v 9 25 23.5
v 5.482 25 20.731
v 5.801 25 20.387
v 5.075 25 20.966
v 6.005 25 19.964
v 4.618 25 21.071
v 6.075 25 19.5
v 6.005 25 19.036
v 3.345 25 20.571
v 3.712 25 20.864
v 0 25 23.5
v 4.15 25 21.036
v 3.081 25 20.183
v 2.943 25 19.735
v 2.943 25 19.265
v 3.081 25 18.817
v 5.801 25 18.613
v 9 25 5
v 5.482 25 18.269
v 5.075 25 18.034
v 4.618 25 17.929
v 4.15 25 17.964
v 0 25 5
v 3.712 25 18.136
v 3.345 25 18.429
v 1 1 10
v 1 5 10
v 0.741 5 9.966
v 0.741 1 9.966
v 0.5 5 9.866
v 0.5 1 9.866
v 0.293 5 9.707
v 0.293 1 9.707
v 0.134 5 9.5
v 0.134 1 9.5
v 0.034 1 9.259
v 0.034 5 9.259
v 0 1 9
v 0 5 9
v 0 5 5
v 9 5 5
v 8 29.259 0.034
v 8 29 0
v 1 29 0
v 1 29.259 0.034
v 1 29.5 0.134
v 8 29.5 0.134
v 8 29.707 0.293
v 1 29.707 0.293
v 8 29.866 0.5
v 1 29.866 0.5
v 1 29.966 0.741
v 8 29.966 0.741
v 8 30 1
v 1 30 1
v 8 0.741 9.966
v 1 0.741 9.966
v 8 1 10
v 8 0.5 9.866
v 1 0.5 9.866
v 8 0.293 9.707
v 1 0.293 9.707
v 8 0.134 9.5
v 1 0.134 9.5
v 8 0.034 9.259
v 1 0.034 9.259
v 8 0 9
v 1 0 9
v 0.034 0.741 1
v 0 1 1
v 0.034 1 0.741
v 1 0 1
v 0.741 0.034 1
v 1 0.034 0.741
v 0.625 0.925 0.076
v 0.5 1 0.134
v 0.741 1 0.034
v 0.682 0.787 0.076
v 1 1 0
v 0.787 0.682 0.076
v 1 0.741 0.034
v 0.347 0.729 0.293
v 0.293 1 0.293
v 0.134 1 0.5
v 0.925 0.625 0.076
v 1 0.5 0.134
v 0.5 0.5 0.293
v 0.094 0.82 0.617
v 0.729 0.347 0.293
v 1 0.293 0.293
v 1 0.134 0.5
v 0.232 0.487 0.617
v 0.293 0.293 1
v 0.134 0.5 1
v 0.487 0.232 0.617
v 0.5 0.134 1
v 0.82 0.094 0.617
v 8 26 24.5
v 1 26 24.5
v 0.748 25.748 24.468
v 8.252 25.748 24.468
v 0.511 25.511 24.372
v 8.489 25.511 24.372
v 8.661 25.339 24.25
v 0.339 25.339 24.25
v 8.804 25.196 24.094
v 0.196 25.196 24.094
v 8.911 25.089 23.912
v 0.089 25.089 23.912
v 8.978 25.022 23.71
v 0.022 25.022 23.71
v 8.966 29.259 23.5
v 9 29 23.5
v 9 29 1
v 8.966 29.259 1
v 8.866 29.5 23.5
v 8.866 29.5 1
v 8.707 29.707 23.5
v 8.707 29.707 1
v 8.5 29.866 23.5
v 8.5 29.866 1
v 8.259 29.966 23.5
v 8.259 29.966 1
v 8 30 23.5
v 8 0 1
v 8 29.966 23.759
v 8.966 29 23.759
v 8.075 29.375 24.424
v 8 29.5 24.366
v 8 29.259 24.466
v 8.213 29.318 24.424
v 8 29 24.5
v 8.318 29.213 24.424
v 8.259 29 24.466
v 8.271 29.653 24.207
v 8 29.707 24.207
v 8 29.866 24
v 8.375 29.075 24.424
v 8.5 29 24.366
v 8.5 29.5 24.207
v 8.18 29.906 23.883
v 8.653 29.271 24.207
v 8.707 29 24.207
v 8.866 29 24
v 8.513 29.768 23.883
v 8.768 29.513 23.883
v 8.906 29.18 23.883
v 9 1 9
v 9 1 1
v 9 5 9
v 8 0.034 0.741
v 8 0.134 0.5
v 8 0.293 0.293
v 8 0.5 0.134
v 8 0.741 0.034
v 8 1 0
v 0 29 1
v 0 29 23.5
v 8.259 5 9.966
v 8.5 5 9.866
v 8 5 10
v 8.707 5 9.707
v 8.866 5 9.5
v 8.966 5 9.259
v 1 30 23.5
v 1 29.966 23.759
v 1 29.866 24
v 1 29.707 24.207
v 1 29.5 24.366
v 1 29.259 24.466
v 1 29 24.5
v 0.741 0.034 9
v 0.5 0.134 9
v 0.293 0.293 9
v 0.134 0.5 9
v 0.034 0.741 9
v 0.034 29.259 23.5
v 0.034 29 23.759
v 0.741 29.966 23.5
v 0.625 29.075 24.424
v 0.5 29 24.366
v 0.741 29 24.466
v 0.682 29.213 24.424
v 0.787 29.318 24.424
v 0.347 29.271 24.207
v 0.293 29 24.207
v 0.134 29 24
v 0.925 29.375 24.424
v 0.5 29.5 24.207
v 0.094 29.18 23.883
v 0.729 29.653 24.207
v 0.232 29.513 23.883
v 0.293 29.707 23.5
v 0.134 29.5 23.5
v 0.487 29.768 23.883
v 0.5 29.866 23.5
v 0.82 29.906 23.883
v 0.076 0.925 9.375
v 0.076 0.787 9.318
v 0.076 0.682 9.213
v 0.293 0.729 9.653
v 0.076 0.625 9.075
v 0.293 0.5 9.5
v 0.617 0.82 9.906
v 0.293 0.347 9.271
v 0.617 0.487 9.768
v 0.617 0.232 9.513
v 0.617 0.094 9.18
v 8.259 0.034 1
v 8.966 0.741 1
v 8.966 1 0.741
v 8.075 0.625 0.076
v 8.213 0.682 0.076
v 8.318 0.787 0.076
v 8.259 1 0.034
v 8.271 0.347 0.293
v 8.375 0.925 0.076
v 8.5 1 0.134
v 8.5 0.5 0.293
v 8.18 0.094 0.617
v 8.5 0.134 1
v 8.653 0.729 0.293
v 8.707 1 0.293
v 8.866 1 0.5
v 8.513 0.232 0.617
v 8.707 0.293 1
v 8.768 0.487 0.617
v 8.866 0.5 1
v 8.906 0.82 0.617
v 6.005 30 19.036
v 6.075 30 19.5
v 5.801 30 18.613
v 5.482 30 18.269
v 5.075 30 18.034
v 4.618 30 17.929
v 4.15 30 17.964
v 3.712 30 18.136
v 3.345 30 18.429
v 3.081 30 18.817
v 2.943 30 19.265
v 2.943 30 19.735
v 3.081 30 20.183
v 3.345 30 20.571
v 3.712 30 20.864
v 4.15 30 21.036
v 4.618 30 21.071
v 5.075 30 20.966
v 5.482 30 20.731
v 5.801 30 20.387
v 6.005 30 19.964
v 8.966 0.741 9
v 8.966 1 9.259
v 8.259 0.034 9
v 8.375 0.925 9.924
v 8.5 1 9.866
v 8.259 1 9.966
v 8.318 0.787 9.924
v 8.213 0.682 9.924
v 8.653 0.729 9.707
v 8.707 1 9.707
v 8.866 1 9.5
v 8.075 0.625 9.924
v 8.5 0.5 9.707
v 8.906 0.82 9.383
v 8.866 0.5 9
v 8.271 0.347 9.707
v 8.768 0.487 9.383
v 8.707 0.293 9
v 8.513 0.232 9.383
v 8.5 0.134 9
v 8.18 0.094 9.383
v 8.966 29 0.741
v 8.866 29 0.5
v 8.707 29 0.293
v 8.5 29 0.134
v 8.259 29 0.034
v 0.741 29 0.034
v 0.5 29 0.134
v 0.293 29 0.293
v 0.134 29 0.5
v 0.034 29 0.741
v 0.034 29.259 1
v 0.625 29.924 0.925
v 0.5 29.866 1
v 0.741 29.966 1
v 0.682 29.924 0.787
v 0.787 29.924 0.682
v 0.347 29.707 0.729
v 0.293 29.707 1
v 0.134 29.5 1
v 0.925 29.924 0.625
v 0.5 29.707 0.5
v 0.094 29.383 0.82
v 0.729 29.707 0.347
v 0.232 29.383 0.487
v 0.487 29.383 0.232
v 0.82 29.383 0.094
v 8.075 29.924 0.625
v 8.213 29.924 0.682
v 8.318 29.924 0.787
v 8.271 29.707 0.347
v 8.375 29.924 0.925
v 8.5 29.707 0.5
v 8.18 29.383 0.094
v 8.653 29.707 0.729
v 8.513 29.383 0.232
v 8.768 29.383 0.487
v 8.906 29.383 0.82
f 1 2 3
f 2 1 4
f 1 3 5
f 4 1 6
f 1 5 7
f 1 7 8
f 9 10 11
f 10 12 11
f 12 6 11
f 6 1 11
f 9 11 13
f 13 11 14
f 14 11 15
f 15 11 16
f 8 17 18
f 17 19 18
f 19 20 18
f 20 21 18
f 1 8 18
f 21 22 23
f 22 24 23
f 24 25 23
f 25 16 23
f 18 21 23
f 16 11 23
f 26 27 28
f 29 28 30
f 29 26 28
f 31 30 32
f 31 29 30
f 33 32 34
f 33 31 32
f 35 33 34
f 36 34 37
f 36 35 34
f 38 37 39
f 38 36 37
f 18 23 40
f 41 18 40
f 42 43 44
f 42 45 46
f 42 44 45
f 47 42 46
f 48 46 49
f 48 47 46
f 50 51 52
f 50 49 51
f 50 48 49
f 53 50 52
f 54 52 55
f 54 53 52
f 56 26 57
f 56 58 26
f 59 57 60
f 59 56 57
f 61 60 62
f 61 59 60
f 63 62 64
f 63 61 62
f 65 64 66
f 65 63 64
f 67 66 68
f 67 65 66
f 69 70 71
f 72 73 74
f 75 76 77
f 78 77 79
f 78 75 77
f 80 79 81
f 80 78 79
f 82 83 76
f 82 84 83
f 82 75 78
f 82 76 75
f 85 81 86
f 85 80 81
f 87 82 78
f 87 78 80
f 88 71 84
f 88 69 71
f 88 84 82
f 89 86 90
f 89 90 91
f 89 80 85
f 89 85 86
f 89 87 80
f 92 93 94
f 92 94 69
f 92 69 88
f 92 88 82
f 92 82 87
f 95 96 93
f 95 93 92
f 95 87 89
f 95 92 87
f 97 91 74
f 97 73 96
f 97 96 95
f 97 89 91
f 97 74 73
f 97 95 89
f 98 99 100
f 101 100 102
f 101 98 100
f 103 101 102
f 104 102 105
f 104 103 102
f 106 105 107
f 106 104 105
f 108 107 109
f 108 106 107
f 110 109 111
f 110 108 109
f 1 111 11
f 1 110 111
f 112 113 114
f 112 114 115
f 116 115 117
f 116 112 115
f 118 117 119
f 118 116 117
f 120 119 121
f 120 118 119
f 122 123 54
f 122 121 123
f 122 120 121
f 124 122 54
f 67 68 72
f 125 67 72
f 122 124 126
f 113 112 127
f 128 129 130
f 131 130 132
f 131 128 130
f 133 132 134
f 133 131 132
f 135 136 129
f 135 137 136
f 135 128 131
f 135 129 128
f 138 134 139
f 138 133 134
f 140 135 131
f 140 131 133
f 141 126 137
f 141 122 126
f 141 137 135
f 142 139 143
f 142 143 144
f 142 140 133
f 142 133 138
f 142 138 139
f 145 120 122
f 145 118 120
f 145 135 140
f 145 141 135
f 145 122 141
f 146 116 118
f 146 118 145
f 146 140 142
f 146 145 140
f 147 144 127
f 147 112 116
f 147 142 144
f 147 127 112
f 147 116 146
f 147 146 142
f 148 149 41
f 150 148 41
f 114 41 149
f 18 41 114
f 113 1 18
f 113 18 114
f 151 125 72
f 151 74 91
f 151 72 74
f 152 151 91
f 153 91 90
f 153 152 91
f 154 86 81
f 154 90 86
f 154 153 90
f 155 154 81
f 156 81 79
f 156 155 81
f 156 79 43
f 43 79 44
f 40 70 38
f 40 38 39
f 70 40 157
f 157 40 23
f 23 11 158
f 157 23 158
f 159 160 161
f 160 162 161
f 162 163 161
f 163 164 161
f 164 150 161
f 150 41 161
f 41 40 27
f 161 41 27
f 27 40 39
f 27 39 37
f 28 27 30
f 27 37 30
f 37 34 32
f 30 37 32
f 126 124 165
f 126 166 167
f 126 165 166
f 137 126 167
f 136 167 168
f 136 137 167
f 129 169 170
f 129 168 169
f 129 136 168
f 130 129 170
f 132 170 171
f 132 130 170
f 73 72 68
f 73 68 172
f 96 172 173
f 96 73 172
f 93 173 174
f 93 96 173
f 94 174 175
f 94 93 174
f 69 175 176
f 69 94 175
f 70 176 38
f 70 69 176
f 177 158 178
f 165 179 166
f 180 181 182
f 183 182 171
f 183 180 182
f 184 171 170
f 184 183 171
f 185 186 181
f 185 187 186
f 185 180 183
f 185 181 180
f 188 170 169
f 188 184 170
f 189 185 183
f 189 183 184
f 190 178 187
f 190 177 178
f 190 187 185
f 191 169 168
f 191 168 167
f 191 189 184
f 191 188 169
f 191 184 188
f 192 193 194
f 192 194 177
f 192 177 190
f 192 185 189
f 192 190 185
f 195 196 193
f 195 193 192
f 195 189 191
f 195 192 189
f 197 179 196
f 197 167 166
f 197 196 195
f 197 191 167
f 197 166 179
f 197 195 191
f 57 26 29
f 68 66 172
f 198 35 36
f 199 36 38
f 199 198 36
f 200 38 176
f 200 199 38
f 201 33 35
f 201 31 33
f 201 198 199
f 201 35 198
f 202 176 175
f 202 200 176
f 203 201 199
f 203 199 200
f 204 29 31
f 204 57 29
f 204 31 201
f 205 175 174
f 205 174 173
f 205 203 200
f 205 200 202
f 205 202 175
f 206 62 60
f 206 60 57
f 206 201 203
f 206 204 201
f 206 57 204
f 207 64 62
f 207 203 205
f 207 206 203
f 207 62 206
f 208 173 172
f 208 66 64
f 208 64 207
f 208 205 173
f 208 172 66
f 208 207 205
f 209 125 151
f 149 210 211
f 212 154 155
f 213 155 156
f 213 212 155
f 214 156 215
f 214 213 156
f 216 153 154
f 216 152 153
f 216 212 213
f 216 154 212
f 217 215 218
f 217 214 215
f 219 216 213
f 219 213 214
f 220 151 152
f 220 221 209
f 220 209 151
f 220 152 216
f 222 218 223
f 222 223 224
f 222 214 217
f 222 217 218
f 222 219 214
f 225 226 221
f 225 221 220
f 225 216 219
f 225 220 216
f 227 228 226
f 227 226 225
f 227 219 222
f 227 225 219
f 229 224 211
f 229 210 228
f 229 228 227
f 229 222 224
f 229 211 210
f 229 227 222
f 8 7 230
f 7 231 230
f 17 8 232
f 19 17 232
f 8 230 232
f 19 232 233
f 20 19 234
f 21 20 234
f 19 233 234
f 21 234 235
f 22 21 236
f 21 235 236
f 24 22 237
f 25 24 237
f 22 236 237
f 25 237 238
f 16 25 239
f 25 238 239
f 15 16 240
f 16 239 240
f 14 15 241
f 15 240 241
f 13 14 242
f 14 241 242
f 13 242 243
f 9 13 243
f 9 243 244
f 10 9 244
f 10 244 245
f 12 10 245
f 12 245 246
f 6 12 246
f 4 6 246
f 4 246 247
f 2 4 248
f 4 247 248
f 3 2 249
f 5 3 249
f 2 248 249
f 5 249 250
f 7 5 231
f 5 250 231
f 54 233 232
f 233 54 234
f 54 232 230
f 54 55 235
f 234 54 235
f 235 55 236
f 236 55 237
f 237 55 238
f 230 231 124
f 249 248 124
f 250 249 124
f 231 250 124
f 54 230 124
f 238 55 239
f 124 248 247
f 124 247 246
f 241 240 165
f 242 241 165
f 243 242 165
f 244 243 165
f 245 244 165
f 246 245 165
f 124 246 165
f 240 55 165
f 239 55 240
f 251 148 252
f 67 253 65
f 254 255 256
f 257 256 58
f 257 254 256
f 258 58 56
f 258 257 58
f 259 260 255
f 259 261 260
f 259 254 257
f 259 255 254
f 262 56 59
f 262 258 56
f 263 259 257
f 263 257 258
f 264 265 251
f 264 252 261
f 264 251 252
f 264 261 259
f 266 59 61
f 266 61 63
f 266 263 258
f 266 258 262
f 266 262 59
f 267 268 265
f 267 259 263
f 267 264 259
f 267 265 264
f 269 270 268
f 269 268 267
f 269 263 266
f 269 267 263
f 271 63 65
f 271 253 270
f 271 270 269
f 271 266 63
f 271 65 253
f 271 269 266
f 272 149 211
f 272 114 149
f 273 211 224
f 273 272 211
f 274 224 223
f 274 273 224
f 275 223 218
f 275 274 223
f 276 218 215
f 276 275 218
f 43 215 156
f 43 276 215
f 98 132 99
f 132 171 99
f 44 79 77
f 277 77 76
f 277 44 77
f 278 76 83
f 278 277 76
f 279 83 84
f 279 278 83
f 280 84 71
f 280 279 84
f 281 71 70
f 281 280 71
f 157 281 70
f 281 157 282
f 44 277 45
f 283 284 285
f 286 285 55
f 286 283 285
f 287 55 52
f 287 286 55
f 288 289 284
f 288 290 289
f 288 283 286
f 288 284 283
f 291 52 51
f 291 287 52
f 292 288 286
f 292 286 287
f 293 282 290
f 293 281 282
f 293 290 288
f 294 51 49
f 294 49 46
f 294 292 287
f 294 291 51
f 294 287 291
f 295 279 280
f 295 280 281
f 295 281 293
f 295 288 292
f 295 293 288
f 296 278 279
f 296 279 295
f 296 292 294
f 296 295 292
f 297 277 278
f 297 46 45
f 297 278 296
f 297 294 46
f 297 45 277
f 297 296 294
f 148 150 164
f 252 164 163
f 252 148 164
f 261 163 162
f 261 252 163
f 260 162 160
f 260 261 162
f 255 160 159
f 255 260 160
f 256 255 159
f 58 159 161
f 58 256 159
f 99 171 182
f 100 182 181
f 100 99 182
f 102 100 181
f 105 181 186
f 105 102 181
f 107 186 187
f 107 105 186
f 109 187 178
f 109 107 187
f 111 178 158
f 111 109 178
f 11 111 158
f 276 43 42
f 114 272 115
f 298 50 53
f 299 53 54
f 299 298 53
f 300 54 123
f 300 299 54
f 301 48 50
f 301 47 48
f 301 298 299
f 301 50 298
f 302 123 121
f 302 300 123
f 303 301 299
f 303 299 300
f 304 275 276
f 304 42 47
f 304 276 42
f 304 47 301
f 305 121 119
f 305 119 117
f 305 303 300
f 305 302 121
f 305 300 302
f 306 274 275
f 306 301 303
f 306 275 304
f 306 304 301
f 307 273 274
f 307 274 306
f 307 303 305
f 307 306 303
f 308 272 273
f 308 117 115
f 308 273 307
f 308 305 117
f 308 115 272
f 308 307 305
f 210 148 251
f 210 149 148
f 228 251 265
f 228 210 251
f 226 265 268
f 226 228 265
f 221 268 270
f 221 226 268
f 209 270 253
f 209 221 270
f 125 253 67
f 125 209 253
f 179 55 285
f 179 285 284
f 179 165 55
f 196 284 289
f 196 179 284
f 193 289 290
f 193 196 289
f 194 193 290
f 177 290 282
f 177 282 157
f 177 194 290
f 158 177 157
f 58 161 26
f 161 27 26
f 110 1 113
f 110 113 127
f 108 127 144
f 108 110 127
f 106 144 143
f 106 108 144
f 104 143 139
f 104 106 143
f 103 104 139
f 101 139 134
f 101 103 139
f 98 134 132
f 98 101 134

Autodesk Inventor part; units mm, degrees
ref_plane "YZ Plane" through (0, 0, 0) normal (1, 0, 0) x (0, 1, 0)
ref_plane "XZ Plane" through (0, 0, 0) normal (0, 1, 0) x (-1, 0, 0)
ref_plane "XY Plane" through (0, 0, 0) normal (0, 0, 1) x (1, 0, 0)
sketch "Sketch1" plane through (0, 0, 0) normal (1, 0, 0) x (0, 1, 0)
  line L0 (0, 0) -> (30, 0)
  line L1 (30, 0) -> (30, 24.5)
  line L2 (30, 24.5) -> (25, 24.5)
  line L3 (25, 24.5) -> (25, 5)
  line L4 (25, 5) -> (5, 5)
  line L5 (5, 5) -> (5, 10)
  line L6 (5, 10) -> (0, 10)
  line L7 (0, 10) -> (0, 0)
  line L8 (25, 5) -> (32.5, 5) construction
  dimension "d0" = 30
  dimension "d1" = 24.5
  dimension "d2" = 5
  dimension "d3" = 19.5
  dimension "d9" = 5
  dimension "d10" = 5
extrude "Extrusion1" add sketch "Sketch1" along normal blind 9
sketch "Sketch4" plane through (0, 30, 24.5) normal (0, 1, 0) x (1, 0, 0)
  circle A0 centre (4.5, 5) radius 1.575
  line L0 (0, 0) -> (9, 0) projected
  line L1 (0, 24.5) -> (0, 0) projected
  dimension "d18" = 3.15
  dimension "d19" = 5
  dimension "d20" = 4.5
extrude "Extrusion3" cut sketch "Sketch4" against normal blind 5
fillet "Fillet1" radius 1 15 edges at (9, 0, 5) (4.5, 0, 10) (0, 0, 5) (4.5, 0, 0) (9, 15, 0) (0, 15, 0) (9, 30, 12.25) (4.5, 30, 0) (0, 30, 12.25) (4.5, 30, 24.5) (4.5, 25, 24.5) (9, 27.5, 24.5) (0, 27.5, 24.5) (9, 2.5, 10) (0, 2.5, 10)
properties part number "bed_spring_holder_front" material "Plastic, Opaque Black"
